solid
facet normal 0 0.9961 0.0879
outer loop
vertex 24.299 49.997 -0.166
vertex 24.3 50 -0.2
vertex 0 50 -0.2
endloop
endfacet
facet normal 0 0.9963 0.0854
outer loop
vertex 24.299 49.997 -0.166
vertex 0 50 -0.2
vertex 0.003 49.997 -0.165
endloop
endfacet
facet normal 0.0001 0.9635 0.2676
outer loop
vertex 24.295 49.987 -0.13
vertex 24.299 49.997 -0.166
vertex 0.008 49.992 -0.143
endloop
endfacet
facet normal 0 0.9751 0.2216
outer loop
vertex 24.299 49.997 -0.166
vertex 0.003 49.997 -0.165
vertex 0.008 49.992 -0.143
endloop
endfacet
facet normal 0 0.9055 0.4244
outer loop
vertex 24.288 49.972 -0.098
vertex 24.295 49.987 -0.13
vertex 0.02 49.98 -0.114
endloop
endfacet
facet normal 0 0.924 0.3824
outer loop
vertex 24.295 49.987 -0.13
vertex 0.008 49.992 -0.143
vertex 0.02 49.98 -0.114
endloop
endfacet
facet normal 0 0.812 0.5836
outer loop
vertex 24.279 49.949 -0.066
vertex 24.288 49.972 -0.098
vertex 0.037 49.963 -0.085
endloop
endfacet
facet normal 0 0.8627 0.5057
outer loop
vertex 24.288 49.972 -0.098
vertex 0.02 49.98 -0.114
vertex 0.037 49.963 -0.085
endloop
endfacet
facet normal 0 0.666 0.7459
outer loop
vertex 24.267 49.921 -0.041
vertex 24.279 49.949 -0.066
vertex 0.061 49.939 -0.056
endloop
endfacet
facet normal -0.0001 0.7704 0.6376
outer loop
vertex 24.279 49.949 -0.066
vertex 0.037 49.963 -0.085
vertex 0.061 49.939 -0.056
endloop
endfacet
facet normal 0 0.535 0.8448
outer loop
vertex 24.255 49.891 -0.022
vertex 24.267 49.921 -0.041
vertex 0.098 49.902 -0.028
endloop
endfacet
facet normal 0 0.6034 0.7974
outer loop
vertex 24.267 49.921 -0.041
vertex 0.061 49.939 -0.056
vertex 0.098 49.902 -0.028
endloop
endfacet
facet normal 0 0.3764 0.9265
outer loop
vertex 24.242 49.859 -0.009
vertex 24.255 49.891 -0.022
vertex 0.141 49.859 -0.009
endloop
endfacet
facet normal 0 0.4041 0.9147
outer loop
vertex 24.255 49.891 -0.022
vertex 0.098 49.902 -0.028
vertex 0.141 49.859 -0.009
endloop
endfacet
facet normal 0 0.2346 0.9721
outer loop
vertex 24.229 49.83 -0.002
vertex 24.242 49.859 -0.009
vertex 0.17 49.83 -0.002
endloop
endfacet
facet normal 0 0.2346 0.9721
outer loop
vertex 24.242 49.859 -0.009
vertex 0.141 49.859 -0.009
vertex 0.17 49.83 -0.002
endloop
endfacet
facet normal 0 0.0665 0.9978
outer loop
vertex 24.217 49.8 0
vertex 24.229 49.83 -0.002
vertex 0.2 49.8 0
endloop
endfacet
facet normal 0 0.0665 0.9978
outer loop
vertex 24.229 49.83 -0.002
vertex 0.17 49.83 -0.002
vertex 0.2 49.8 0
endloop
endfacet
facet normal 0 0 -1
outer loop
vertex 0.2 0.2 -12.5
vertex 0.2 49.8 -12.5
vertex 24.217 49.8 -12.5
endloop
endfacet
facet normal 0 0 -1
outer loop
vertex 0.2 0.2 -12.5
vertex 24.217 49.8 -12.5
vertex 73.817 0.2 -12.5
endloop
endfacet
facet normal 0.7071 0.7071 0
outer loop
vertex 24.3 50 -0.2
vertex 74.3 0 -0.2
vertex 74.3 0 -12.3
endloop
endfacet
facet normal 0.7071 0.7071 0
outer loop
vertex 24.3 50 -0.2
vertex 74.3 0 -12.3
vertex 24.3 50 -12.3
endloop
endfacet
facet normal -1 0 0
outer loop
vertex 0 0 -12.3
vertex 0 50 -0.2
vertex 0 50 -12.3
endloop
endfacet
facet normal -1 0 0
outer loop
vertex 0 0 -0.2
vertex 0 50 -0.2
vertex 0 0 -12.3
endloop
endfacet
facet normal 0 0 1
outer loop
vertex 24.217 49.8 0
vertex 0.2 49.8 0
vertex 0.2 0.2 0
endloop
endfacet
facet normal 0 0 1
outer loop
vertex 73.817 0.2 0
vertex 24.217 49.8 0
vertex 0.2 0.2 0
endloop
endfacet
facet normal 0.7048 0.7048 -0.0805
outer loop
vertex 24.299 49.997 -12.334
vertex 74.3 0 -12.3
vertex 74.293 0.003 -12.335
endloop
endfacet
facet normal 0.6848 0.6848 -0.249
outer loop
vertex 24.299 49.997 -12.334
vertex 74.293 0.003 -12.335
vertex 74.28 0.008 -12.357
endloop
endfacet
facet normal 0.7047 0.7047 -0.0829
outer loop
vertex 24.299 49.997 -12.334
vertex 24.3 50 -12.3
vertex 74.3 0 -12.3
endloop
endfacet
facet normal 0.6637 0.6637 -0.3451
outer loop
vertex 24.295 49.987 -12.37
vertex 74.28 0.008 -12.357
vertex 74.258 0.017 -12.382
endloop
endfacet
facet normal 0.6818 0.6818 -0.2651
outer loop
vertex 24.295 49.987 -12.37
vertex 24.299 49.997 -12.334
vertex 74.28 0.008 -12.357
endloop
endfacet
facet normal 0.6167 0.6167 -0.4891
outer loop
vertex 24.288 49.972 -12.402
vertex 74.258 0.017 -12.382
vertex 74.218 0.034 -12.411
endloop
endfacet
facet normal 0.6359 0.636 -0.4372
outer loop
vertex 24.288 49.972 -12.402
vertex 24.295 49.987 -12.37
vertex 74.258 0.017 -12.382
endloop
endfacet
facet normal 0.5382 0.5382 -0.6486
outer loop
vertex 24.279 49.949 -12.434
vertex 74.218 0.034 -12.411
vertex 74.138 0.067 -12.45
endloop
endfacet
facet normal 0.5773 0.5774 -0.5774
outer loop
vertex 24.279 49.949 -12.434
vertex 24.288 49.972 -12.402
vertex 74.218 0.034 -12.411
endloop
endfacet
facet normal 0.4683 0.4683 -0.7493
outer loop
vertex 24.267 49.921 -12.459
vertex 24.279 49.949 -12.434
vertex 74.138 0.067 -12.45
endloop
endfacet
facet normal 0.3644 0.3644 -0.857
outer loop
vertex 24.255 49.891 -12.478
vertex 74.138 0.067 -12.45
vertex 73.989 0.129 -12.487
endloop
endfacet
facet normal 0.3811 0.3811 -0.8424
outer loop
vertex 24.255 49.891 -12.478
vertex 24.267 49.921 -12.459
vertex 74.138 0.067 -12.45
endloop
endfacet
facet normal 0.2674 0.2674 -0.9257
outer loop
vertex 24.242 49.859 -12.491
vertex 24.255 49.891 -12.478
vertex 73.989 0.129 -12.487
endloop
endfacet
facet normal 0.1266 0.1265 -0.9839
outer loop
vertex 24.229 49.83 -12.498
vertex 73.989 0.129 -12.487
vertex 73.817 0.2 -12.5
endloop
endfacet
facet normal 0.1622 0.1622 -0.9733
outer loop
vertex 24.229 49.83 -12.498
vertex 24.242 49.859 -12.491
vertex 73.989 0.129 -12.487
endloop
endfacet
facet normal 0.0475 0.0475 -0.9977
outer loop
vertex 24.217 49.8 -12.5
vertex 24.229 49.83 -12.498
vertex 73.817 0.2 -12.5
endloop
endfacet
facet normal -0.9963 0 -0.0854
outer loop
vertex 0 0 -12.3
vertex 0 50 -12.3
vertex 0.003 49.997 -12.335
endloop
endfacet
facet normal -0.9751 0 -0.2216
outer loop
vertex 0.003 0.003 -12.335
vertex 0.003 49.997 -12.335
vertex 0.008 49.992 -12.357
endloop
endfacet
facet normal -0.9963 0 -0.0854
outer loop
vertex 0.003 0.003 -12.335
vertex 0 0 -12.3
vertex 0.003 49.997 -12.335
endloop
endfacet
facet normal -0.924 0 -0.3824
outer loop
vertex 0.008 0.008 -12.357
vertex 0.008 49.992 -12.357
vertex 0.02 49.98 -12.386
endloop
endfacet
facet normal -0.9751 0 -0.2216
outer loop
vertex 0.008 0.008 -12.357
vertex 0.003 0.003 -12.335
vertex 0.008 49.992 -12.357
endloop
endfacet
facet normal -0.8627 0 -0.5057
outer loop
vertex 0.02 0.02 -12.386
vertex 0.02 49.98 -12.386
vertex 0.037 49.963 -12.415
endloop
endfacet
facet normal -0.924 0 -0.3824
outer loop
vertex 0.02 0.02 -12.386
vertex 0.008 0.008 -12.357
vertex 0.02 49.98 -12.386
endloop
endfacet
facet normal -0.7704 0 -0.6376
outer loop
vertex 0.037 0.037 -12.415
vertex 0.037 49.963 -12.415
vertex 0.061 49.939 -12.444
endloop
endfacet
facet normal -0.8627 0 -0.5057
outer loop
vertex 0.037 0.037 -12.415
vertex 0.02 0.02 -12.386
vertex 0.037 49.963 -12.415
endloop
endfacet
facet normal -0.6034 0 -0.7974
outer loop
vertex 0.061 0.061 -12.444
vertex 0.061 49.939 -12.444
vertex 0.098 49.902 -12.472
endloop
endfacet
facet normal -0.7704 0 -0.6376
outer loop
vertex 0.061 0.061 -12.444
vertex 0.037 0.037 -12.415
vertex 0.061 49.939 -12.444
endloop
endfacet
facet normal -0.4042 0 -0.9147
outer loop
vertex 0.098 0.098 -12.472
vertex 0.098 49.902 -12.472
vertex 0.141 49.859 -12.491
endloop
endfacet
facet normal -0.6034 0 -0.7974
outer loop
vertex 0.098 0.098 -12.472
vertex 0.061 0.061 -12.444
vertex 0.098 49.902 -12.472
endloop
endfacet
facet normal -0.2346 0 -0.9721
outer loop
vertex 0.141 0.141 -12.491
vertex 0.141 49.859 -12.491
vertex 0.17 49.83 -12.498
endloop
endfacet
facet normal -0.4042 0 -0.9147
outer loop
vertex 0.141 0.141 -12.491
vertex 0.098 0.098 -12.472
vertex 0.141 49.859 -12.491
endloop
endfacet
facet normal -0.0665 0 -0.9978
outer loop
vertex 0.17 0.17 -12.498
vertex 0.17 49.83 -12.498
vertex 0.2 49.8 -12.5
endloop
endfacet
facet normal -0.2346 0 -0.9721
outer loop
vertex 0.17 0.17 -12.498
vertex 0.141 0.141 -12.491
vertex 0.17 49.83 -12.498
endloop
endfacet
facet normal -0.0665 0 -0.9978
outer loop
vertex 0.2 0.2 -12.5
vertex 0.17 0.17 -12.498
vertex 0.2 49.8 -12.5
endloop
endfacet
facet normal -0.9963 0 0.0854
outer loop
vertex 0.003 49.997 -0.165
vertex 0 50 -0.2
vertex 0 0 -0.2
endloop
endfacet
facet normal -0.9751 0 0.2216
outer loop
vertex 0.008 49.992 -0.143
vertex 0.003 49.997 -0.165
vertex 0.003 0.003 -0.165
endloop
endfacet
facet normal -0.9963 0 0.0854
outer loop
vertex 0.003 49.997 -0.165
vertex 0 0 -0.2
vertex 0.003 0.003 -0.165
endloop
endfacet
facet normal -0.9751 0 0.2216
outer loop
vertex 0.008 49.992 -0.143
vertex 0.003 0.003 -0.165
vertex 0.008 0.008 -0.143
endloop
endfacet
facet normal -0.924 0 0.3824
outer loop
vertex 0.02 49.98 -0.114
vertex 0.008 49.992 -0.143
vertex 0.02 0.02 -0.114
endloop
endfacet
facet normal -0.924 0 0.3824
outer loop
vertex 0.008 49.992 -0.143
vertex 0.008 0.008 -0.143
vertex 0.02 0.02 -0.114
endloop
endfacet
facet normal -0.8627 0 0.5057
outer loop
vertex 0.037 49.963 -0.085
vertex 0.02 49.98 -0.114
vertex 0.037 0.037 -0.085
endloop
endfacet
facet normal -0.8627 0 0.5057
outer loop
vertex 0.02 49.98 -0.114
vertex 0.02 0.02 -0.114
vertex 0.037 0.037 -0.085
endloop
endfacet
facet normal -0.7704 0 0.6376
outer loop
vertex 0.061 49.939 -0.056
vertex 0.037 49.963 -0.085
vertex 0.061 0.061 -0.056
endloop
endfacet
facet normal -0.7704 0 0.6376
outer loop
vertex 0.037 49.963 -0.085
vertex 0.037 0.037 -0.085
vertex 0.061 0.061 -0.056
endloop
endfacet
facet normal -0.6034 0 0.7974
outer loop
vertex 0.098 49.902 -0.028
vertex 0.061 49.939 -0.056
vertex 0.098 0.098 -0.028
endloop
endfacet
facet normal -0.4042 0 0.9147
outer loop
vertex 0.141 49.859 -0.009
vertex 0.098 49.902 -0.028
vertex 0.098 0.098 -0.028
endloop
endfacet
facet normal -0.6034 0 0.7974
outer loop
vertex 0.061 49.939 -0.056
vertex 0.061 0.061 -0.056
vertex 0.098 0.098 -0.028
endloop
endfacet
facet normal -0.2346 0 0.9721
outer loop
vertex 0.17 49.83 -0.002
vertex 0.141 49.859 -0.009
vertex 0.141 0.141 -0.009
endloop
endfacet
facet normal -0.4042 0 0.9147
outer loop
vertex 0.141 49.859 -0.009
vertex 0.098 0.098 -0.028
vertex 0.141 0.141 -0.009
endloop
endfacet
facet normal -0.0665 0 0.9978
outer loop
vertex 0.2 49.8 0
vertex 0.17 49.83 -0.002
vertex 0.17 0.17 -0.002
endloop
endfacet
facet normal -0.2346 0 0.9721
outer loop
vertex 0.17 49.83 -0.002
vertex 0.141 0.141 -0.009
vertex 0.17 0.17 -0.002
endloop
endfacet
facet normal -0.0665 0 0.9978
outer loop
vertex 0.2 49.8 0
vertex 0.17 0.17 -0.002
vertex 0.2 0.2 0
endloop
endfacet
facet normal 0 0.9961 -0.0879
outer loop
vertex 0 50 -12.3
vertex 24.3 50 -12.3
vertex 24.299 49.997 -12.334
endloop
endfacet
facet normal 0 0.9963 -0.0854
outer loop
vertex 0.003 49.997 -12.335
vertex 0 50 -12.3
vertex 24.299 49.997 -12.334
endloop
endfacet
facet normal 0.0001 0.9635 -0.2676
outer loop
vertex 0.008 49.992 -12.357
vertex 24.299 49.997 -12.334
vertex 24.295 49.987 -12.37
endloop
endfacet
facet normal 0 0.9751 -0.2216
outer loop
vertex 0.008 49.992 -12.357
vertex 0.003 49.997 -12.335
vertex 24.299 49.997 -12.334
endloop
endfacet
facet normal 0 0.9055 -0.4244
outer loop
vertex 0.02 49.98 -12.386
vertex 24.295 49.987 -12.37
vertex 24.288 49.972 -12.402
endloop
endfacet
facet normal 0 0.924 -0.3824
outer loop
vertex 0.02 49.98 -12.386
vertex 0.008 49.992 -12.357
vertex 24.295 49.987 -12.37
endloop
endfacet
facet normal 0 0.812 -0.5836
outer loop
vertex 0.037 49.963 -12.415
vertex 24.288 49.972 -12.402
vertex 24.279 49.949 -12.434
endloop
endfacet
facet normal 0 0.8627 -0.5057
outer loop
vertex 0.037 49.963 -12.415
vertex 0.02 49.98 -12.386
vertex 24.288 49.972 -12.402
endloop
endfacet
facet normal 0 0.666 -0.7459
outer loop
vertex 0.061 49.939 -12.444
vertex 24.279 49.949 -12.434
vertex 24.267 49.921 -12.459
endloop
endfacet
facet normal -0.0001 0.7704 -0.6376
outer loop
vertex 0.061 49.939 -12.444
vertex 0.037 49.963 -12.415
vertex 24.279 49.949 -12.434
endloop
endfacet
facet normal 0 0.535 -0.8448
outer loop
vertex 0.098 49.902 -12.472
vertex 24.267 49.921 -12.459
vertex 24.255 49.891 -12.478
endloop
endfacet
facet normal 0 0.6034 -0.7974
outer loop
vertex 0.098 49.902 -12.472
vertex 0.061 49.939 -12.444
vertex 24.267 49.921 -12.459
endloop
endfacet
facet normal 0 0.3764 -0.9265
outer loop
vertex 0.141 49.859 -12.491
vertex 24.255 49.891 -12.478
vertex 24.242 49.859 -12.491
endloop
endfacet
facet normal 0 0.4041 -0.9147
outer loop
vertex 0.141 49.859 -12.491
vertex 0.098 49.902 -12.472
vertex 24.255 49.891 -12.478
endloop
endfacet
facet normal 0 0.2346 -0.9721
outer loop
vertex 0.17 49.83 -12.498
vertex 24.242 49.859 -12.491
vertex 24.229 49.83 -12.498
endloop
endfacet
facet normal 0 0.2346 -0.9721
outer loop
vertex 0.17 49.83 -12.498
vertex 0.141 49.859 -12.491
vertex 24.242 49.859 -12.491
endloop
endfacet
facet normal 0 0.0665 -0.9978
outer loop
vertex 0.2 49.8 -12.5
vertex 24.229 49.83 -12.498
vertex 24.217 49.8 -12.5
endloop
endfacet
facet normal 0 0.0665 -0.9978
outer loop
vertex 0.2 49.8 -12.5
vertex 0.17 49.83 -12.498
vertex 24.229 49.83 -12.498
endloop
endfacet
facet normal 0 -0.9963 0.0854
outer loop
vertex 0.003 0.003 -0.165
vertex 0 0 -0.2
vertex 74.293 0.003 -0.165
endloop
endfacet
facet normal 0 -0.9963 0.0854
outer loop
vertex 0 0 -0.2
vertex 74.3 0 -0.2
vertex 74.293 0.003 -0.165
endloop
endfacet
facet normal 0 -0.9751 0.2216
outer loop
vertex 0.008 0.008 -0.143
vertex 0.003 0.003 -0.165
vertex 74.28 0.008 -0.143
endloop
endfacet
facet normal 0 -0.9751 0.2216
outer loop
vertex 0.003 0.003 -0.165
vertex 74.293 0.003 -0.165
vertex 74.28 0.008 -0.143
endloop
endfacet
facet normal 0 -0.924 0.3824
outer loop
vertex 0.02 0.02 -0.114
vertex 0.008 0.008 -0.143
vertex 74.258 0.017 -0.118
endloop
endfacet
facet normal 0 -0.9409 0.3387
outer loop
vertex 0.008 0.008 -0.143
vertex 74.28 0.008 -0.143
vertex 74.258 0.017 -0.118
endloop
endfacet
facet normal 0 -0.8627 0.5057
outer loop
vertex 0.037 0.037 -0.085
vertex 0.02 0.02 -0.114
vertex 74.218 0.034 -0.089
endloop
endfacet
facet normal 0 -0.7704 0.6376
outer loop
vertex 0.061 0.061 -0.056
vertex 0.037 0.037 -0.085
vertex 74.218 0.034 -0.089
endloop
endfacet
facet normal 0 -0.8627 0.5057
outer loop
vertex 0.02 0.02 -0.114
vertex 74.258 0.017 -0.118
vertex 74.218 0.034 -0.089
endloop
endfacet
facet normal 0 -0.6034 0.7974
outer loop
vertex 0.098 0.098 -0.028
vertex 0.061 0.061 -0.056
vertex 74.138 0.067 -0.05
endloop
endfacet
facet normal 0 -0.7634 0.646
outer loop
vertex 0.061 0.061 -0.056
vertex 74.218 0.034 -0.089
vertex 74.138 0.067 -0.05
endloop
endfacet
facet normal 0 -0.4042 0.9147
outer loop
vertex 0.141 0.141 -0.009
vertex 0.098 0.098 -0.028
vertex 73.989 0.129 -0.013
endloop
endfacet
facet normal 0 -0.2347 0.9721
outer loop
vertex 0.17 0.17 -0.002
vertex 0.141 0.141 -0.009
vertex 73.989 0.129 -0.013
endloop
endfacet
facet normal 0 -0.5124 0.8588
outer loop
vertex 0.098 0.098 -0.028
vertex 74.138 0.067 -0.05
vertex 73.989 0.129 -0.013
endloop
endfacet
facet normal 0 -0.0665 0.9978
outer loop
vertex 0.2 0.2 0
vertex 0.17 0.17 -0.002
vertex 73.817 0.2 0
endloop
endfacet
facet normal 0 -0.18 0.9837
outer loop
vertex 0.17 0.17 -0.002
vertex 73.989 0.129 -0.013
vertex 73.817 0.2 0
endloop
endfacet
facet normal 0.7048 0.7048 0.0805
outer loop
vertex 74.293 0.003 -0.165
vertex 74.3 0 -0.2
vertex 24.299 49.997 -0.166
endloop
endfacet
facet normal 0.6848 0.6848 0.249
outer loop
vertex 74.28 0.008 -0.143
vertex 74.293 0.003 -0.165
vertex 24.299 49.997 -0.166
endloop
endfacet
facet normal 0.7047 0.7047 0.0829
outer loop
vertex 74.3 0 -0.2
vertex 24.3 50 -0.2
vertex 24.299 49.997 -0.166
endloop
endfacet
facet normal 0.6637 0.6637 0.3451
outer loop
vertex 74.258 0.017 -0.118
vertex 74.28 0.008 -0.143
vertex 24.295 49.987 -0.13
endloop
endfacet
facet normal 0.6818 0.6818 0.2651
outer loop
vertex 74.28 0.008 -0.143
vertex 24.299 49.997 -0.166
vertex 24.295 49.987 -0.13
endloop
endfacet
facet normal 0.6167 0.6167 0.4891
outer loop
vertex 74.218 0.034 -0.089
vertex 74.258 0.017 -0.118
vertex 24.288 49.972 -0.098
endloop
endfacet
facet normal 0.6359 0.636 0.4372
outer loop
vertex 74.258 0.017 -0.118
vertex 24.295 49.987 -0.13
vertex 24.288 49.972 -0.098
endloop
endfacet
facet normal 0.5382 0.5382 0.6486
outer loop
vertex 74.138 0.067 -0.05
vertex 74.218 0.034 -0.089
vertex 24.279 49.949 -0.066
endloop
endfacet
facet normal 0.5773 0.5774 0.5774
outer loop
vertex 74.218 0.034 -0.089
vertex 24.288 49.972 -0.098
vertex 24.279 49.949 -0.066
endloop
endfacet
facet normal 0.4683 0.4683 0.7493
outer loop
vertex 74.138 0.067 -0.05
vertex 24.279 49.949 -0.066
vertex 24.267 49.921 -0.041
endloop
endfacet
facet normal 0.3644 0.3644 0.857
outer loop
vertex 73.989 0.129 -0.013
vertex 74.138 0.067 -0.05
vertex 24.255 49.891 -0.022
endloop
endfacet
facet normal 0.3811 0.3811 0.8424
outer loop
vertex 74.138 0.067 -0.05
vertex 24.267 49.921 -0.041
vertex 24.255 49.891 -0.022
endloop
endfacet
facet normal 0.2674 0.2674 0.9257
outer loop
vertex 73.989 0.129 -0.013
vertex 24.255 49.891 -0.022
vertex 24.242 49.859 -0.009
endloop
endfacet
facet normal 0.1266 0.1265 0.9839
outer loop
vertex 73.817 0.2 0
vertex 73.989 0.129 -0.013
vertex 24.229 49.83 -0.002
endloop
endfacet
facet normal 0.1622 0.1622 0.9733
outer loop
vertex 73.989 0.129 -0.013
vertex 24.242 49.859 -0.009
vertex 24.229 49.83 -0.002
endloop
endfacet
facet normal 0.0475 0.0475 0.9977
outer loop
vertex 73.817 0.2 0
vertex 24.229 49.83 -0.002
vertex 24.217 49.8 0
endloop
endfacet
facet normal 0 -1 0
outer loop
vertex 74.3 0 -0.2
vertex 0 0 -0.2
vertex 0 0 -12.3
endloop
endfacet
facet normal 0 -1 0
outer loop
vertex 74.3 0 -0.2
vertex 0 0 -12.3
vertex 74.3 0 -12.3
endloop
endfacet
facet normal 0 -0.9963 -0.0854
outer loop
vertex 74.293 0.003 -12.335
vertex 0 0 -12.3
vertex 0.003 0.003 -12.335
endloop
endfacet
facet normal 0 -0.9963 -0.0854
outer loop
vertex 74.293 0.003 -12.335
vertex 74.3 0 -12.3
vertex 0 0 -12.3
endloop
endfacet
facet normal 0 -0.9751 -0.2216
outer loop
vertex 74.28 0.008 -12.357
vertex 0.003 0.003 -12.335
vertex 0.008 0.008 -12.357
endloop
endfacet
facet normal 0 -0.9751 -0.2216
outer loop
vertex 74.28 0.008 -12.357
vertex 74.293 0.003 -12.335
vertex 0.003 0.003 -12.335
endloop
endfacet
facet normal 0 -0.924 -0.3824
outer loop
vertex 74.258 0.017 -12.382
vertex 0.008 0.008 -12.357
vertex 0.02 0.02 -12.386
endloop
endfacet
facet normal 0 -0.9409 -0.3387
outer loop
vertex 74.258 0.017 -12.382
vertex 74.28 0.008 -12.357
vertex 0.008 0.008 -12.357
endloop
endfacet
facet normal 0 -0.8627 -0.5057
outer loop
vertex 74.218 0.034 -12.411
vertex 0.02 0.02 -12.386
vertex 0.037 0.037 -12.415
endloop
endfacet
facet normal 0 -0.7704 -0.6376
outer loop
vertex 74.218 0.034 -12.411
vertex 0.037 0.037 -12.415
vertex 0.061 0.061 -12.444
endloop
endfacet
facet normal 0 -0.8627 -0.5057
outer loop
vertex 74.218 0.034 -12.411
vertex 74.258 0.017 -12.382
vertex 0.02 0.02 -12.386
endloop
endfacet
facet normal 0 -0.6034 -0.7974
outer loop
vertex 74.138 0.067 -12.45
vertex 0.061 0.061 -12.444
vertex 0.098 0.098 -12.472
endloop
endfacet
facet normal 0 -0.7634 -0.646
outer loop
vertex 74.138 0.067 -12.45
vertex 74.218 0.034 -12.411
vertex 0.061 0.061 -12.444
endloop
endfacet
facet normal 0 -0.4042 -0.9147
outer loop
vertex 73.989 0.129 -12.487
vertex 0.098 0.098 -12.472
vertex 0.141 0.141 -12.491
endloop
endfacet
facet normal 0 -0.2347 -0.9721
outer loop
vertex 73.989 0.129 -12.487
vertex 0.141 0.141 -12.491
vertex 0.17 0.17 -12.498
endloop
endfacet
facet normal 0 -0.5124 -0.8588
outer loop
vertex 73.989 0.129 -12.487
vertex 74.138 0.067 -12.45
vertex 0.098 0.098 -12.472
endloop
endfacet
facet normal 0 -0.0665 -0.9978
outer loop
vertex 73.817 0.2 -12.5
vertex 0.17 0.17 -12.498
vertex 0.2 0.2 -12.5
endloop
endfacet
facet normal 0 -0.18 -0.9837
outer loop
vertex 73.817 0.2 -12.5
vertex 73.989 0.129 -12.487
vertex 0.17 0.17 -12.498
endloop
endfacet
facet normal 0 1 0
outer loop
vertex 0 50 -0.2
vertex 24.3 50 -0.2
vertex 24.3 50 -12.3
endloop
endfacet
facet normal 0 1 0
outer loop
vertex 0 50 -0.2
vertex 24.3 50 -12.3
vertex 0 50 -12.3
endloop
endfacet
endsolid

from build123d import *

# Parameters (mm, degrees)
F1_DEPTH = 12.5
F2_R     = 0.2


with BuildPart() as f1:
    # F0 (on Top) → F1 (new body)
    with BuildSketch(Plane.XY):
        Polygon((0, 50), (0, 0), (74.3, 0), (24.3, 50), align=None)
    extrude(amount=-F1_DEPTH)

    # F2
    f2_edges = [f1.edges().sort_by_distance(p)[0] for p in [
        (12.15, 50, 0),
        (0, 25, 0),
        (37.15, 0, 0),
        (49.3, 25, 0),
        (12.15, 50, -12.5),
        (0, 25, -12.5),
        (37.15, 0, -12.5),
        (49.3, 25, -12.5),
    ]]
    fillet(f2_edges, radius=F2_R)


solid = f1.part
